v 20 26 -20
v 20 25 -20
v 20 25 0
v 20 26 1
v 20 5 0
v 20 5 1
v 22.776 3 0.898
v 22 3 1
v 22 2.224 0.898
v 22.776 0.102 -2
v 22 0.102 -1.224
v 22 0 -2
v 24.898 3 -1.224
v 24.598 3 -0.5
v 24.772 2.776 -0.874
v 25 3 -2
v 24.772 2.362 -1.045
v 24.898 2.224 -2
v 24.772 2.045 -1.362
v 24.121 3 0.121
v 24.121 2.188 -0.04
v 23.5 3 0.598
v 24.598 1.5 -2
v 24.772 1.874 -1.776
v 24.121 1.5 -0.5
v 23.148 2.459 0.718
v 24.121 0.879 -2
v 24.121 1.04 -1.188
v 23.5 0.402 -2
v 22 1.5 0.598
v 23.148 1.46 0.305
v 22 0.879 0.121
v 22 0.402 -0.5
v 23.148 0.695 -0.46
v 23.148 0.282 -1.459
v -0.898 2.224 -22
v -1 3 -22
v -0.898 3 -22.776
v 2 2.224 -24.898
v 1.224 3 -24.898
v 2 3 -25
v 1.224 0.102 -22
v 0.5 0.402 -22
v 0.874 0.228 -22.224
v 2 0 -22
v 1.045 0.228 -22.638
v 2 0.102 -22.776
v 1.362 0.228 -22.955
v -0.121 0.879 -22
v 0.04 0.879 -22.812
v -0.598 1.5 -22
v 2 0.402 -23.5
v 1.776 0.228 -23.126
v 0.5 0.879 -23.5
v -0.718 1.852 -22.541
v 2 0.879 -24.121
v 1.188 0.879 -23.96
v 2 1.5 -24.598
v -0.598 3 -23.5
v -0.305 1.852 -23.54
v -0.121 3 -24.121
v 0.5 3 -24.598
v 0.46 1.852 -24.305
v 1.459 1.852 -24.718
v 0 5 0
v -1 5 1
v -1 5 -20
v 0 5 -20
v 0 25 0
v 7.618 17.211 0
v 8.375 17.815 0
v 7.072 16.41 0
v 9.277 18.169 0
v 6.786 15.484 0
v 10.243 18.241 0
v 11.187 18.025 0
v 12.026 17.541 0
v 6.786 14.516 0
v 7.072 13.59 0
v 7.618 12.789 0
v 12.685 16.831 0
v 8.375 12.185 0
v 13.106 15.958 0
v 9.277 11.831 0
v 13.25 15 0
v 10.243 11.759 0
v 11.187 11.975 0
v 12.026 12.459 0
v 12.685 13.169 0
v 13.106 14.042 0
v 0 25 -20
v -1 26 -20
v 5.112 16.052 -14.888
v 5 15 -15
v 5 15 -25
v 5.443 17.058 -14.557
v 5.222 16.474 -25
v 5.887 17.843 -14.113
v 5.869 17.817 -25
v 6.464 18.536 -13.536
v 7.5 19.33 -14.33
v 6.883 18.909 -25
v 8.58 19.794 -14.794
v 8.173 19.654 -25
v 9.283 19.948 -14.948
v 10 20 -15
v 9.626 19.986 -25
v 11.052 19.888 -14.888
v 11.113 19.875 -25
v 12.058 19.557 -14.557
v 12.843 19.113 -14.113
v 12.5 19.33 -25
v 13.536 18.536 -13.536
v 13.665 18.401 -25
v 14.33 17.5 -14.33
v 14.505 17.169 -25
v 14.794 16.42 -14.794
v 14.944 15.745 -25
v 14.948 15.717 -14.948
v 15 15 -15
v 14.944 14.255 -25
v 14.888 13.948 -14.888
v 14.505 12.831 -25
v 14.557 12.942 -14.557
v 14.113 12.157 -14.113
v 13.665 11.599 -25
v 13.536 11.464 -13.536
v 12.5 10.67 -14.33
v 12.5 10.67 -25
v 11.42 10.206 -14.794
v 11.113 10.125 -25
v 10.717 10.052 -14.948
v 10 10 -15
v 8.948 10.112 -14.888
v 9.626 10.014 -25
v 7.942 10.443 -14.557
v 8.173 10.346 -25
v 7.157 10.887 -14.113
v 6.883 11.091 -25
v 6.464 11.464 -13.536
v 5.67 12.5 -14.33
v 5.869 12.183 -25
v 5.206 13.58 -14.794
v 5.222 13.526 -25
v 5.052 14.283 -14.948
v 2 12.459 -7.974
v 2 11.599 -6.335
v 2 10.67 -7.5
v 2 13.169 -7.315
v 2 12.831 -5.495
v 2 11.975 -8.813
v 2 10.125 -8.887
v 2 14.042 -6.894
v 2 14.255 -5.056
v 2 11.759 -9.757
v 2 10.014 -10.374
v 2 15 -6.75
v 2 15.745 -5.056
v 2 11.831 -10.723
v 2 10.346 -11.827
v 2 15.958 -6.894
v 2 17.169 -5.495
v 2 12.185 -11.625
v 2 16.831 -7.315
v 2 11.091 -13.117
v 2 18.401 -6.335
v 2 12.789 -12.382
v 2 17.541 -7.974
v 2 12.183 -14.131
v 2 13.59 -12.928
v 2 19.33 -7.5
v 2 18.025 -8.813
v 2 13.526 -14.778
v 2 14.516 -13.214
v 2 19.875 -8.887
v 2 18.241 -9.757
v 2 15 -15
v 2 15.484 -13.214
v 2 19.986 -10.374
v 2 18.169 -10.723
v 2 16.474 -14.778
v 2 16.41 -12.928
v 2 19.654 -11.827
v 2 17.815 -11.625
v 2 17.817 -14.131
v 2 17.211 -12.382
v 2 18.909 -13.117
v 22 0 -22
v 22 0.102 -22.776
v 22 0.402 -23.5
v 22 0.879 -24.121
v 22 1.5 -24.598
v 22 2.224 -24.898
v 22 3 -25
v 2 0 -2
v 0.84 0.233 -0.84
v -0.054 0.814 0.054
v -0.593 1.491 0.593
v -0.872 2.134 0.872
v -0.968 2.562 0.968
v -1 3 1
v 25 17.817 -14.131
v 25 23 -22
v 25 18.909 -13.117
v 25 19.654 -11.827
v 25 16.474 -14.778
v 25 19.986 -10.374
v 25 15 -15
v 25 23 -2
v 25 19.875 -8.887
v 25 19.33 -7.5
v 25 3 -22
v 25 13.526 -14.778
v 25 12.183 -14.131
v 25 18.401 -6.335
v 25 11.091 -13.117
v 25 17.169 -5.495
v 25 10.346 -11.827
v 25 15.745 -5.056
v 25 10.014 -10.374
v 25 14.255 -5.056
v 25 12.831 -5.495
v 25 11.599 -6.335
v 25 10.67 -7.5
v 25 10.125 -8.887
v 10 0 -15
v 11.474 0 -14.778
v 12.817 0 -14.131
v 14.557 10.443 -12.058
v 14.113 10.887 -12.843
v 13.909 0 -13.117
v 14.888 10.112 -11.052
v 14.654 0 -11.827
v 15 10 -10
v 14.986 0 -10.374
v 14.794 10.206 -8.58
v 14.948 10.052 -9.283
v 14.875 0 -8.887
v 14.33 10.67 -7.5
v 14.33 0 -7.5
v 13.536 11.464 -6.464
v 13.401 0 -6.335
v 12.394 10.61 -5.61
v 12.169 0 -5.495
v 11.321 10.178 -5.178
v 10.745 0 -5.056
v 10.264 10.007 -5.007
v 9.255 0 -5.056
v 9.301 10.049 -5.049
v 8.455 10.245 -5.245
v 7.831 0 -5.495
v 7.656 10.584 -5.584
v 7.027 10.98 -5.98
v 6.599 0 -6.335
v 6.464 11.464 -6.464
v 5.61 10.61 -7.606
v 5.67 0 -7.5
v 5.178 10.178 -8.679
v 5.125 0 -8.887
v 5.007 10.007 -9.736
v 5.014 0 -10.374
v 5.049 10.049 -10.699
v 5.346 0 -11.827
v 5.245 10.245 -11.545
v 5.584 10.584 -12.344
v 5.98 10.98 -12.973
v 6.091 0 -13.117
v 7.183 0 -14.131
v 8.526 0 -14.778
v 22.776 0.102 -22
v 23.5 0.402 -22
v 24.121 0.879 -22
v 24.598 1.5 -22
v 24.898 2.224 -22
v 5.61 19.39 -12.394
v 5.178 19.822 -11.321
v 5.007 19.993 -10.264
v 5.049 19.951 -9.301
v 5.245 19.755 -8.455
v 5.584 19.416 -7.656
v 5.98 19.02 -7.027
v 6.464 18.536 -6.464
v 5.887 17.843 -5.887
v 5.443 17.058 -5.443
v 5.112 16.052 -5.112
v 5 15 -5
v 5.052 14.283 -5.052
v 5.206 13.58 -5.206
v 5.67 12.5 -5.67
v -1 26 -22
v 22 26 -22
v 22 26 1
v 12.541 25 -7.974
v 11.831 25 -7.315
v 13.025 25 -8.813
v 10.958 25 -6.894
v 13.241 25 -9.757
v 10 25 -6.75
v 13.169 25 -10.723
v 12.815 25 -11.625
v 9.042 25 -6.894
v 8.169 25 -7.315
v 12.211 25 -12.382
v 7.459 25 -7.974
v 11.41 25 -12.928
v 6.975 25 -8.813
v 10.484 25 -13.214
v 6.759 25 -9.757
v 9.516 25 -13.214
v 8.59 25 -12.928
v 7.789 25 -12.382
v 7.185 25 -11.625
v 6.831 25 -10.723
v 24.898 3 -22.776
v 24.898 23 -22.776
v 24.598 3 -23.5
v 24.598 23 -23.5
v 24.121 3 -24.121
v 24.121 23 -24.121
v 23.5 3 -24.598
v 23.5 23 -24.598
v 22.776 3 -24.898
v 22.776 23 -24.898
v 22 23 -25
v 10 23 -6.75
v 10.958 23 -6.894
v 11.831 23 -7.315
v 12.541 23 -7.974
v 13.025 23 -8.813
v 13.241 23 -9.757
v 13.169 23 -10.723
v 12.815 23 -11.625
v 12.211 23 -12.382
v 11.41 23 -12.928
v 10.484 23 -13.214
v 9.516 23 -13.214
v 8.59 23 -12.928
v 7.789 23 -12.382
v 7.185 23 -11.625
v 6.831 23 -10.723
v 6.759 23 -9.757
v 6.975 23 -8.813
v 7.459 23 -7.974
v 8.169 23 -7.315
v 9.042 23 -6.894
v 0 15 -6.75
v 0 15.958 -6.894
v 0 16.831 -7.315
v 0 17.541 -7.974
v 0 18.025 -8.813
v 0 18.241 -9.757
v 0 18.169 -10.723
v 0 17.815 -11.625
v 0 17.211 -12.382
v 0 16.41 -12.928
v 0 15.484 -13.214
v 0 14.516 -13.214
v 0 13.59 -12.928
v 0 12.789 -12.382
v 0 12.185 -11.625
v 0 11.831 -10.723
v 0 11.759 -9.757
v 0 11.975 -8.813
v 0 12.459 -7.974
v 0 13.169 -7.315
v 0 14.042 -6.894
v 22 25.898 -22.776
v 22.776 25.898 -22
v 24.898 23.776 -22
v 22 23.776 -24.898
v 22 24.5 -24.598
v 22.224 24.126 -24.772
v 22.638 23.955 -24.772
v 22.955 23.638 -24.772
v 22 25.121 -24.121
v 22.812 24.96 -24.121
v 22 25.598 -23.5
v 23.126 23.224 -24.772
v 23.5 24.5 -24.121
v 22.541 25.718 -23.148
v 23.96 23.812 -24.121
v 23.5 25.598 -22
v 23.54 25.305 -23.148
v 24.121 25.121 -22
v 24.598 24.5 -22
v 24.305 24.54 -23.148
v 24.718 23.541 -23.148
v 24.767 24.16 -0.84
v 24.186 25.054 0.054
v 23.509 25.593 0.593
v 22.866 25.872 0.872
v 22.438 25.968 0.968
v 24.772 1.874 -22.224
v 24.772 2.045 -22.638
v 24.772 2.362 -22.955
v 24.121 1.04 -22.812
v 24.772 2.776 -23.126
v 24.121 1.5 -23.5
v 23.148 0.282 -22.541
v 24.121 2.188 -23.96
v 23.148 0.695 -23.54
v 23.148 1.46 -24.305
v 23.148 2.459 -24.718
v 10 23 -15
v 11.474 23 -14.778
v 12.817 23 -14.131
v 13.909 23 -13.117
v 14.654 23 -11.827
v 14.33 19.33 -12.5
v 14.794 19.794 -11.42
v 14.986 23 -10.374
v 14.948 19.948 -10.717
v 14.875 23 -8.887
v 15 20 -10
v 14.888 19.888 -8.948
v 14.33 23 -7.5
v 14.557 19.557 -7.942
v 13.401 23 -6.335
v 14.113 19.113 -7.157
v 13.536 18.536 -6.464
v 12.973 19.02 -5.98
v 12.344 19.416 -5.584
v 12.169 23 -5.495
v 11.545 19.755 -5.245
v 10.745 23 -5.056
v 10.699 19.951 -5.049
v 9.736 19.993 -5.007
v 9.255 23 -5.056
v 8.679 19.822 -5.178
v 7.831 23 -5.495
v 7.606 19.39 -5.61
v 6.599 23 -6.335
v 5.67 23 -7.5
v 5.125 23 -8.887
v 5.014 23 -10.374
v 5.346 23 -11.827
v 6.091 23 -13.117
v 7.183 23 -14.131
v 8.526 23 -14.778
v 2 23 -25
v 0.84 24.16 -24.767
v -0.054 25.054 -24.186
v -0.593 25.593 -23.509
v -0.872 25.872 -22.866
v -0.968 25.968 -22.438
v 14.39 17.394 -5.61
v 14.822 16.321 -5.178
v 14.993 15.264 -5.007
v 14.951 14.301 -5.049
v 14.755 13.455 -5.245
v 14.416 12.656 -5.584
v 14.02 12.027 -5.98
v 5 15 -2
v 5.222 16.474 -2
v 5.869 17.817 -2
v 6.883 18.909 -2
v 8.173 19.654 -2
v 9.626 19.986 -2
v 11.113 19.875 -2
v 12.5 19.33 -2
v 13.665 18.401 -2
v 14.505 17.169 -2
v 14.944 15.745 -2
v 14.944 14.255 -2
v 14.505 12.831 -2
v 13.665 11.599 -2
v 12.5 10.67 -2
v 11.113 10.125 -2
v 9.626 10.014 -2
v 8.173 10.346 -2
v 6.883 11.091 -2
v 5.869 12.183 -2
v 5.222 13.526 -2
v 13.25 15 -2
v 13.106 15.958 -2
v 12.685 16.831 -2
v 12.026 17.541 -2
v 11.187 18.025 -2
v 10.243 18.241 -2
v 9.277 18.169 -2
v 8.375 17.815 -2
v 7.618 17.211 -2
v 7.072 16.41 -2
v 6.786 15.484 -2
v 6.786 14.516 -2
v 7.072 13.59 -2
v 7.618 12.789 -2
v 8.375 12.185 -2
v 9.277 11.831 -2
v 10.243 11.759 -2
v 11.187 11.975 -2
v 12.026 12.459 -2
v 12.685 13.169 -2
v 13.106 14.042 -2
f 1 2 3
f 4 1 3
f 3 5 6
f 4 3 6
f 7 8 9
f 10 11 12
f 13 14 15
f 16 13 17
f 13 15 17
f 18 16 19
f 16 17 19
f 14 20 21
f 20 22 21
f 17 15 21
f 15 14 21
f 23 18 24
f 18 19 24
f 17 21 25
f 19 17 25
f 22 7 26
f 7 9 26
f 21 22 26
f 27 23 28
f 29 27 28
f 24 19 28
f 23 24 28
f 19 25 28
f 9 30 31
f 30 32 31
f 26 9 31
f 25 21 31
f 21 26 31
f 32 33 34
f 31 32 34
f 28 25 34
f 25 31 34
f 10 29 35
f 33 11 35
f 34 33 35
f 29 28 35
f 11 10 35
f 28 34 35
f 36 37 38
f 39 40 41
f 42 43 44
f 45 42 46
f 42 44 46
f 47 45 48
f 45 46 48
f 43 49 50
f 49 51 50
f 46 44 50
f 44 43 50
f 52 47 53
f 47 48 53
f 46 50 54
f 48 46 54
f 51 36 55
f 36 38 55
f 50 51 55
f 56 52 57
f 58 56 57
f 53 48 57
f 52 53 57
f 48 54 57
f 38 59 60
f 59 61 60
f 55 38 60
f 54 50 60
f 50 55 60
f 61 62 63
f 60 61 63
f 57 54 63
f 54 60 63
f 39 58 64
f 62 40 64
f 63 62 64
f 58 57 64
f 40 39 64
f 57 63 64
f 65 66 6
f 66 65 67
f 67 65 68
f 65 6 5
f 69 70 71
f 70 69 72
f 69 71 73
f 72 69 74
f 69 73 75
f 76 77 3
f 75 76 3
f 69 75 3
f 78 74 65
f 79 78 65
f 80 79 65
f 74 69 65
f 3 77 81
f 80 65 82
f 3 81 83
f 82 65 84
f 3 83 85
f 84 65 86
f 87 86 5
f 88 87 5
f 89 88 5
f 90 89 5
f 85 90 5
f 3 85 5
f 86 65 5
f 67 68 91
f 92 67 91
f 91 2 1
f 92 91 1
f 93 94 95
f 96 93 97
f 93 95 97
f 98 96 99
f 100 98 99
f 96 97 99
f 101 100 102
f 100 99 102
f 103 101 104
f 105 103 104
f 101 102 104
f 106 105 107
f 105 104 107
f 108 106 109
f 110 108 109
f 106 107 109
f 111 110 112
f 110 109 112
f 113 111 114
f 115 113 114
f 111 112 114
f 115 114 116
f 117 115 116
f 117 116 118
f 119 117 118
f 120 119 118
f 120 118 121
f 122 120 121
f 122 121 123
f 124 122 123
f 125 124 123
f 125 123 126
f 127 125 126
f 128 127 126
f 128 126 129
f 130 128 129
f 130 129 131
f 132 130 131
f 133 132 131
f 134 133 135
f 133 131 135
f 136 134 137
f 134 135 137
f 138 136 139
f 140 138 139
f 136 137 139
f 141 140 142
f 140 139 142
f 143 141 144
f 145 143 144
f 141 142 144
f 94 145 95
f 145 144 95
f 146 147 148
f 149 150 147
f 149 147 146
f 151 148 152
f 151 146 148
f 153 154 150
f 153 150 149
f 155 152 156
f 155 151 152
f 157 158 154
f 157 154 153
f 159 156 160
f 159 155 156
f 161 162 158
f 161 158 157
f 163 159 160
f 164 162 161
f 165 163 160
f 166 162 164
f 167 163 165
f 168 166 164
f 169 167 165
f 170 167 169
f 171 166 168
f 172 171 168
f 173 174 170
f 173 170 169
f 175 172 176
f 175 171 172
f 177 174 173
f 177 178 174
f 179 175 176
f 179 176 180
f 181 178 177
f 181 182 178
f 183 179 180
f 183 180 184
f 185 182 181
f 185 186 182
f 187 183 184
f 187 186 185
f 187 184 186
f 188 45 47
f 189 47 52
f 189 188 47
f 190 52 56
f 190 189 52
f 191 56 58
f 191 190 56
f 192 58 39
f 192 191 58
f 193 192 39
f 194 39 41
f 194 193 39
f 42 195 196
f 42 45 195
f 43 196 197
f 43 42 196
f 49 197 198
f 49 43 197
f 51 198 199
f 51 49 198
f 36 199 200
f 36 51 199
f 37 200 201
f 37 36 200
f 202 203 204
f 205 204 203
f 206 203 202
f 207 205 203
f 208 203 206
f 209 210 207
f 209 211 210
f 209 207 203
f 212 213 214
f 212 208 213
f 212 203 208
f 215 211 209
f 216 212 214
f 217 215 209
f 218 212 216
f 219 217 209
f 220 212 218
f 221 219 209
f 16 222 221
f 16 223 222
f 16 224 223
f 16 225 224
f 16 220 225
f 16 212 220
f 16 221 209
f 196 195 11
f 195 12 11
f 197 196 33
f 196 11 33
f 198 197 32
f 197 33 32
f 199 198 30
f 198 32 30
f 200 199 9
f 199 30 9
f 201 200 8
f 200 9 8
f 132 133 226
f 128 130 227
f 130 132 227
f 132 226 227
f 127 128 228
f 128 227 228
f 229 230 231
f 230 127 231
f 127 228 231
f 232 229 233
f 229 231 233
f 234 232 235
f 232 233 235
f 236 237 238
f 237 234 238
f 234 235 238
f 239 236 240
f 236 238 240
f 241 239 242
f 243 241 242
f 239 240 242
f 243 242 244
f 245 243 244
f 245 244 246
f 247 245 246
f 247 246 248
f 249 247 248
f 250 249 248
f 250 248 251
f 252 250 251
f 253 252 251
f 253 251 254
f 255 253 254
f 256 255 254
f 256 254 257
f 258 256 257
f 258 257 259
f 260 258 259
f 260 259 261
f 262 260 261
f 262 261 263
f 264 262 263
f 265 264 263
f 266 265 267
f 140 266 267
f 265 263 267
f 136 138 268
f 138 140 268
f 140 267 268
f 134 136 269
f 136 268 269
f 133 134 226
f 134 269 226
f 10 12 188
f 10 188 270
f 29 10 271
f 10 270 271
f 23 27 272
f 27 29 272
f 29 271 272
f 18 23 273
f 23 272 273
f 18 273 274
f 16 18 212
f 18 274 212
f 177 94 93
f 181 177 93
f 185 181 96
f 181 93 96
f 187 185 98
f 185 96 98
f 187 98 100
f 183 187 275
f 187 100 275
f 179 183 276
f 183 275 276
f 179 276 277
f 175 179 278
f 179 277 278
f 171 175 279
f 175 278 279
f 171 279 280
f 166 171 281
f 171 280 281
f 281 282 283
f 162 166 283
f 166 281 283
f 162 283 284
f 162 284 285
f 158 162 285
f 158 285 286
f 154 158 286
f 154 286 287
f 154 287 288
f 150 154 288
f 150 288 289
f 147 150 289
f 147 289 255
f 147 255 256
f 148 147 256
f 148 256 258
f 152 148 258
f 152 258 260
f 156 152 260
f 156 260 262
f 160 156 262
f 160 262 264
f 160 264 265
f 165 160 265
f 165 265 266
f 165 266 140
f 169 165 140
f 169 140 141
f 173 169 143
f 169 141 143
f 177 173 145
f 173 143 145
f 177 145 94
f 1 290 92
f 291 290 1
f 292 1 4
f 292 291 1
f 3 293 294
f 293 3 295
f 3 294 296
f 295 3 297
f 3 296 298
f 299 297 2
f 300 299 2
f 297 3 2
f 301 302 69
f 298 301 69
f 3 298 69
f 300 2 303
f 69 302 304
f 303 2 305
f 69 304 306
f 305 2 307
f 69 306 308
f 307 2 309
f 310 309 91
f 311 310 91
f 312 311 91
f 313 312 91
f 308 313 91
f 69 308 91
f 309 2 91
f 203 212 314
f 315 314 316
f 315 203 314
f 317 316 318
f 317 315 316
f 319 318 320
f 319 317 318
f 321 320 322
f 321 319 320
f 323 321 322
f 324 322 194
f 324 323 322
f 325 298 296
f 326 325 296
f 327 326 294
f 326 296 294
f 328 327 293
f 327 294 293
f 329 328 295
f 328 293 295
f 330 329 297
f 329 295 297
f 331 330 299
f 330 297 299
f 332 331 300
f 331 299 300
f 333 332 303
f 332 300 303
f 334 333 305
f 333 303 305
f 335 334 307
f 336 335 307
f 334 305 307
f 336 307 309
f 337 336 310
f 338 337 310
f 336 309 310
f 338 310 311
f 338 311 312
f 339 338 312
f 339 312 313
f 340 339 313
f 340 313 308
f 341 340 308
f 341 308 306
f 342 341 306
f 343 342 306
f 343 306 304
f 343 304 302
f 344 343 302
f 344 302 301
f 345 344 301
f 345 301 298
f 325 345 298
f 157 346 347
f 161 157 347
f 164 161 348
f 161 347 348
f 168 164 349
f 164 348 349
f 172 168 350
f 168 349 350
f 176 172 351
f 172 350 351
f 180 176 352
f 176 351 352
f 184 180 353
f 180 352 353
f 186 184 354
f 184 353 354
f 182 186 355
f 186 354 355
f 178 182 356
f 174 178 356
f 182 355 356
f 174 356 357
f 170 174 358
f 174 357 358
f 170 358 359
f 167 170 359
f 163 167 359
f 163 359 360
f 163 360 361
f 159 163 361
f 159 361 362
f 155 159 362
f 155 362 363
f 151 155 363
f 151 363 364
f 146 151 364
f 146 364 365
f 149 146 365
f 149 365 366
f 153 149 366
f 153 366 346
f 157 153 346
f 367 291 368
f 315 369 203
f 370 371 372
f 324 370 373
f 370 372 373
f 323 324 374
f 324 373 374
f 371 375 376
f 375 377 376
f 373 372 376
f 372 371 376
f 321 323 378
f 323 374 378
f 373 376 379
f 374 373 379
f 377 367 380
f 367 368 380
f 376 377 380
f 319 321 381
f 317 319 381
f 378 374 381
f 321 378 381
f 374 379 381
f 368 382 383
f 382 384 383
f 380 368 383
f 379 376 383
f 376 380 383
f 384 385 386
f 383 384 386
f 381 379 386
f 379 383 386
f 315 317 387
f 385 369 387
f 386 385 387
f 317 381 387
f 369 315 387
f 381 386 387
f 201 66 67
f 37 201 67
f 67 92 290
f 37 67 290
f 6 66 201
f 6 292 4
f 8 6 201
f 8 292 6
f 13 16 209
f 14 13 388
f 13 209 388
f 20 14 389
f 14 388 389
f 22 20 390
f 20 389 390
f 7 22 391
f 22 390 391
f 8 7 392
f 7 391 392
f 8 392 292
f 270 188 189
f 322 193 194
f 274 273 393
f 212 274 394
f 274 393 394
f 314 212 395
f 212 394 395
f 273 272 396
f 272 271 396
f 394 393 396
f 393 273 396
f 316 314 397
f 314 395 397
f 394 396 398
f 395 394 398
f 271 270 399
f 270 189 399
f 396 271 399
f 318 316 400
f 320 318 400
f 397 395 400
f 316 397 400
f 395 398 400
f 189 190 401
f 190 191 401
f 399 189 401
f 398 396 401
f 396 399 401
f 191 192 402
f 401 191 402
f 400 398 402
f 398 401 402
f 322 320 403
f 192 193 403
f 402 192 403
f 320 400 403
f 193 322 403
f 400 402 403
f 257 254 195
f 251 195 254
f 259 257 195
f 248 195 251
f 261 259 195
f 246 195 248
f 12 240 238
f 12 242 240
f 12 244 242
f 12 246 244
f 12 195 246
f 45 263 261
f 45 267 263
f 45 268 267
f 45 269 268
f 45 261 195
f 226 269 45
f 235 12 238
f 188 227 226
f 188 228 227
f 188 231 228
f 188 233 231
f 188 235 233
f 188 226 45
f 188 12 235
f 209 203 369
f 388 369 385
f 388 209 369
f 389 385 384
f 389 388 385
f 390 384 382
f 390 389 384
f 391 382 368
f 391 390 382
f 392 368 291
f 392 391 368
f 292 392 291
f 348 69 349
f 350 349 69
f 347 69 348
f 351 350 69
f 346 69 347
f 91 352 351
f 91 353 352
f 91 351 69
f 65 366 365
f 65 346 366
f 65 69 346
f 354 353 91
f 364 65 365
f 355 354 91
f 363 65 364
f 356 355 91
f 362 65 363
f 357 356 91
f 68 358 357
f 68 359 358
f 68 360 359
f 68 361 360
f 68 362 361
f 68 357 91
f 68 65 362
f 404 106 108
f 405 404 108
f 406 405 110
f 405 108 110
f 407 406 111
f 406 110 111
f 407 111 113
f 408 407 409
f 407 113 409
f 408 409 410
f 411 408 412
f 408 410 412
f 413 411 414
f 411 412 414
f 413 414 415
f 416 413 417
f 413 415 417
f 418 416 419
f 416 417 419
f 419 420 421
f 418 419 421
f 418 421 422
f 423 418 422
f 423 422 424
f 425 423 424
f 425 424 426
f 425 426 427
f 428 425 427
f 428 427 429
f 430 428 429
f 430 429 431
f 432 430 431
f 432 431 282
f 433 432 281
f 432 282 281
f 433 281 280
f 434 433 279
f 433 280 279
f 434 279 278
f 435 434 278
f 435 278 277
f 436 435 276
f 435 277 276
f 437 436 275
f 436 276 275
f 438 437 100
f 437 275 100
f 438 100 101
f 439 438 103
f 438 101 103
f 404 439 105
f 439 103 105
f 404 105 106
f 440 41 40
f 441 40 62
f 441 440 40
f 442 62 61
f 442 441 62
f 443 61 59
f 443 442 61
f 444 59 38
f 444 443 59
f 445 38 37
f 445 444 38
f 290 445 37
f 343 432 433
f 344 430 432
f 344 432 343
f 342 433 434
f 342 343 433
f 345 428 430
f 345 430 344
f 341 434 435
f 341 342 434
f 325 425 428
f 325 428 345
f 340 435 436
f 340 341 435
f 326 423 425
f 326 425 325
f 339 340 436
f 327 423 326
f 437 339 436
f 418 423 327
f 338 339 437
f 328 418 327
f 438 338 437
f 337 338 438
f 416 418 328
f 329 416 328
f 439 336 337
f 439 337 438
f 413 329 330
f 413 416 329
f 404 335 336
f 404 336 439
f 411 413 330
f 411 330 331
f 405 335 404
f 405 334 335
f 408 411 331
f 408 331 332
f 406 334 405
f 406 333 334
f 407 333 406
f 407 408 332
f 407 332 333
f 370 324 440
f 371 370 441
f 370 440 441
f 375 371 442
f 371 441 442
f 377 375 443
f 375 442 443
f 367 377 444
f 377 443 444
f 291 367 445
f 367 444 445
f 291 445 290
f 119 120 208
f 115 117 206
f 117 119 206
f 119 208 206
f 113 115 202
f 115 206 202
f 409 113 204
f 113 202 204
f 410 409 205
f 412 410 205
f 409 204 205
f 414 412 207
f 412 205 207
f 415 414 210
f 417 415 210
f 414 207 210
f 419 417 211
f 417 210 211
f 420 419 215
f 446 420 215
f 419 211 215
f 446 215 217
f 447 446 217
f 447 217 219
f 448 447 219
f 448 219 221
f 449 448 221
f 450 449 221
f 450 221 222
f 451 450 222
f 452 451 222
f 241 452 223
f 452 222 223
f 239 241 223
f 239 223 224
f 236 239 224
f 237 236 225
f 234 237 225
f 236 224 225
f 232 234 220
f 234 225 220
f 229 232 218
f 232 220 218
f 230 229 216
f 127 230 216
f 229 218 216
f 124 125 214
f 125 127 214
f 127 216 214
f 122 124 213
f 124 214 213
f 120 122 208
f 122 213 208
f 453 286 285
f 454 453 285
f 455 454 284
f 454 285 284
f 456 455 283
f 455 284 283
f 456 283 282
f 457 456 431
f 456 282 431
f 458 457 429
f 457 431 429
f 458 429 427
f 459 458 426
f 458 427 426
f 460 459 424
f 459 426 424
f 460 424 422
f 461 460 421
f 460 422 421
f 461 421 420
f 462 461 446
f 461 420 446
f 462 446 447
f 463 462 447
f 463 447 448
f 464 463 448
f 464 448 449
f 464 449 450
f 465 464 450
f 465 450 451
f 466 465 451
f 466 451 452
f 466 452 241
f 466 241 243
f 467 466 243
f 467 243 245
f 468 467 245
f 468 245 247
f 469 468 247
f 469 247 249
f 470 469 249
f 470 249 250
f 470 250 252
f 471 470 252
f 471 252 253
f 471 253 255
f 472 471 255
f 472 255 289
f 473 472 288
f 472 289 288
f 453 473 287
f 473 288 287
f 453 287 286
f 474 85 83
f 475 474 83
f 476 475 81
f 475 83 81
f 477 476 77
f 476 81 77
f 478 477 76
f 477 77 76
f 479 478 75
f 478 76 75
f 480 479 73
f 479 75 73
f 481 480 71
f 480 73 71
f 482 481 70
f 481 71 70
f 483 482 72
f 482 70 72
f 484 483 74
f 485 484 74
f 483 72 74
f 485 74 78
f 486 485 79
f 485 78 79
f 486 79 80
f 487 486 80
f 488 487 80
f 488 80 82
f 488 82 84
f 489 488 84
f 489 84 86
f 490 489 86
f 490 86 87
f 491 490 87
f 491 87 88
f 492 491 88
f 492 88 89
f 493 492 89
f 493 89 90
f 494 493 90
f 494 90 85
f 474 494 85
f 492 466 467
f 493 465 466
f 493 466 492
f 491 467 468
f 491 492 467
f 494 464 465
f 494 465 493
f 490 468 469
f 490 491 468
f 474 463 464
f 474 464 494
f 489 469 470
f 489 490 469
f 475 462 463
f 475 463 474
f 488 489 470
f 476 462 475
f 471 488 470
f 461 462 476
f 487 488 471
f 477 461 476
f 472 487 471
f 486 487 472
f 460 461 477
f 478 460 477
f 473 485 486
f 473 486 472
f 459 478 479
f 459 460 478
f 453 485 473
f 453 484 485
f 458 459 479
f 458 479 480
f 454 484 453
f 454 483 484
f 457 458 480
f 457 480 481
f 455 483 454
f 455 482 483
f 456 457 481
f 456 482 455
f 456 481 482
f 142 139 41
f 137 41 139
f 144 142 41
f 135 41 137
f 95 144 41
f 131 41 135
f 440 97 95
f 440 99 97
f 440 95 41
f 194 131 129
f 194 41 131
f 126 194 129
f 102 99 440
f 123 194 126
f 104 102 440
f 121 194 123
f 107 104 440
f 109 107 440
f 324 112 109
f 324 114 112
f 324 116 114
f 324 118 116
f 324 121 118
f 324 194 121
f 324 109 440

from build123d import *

# Parameters (mm, degrees)
SKETCH2_W           = 25
SKETCH2_H           = 25
BOSS_EXTRUDE1_DEPTH = 25
SKETCH3_R           = 3.25
CUT_EXTRUDE1_DEPTH  = 44.301270189
SKETCH4_R           = 3.25
CUT_EXTRUDE2_DEPTH  = 44.301270189
SKETCH5_R           = 3.25
CUT_EXTRUDE3_DEPTH  = 44.301270189
SKETCH6_R           = 5
CUT_EXTRUDE4_DEPTH  = 23
SKETCH7_R           = 5
CUT_EXTRUDE5_DEPTH  = 23
SKETCH12_R          = 5
CUT_EXTRUDE9_DEPTH  = 23
BOSS_EXTRUDE2_DEPTH = 1
BOSS_EXTRUDE3_DEPTH = 1
BOSS_EXTRUDE4_DEPTH = 1
FILLET2_R           = 3


with BuildPart() as part:
    # Sketch2 → Boss-Extrude1 (new body)
    with BuildSketch(Plane(origin=(0, 0, 0), x_dir=(1, 0, 0), z_dir=(0, 1, 0))):
        with Locations((12.5, 12.5)):
            Rectangle(SKETCH2_W, SKETCH2_H)
    extrude(amount=BOSS_EXTRUDE1_DEPTH)

    # Sketch3 → Cut-Extrude1 (cut, through all)
    with BuildSketch(Plane(origin=(0, 25, 0), x_dir=(1, 0, 0), z_dir=(0, 1, 0))):
        with Locations(Location((10, 10, 0), (0, 0, 270))):
            Circle(SKETCH3_R)
    extrude(amount=-CUT_EXTRUDE1_DEPTH, mode=Mode.SUBTRACT)

    # Sketch4 → Cut-Extrude2 (cut, through all)
    with BuildSketch(Plane.ZY):
        with Locations((-10, 15)):
            Circle(SKETCH4_R)
    extrude(amount=-CUT_EXTRUDE2_DEPTH, mode=Mode.SUBTRACT)

    # Sketch5 → Cut-Extrude3 (cut, through all)
    with BuildSketch(Plane.XY):
        with Locations((10, 15)):
            Circle(SKETCH5_R)
    extrude(amount=-CUT_EXTRUDE3_DEPTH, mode=Mode.SUBTRACT)

    # Sketch6 → Cut-Extrude4 (cut)
    with BuildSketch(Plane(origin=(0, 0, -25), x_dir=(-1, 0, 0), z_dir=(0, 0, -1))):
        with Locations((-10, 15)):
            Circle(SKETCH6_R)
    extrude(amount=-CUT_EXTRUDE4_DEPTH, mode=Mode.SUBTRACT)

    # Sketch7 → Cut-Extrude5 (cut)
    with BuildSketch(Plane(origin=(25, 0, 0), x_dir=(0, 0, -1), z_dir=(1, 0, 0))):
        with Locations((10, 15)):
            Circle(SKETCH7_R)
    extrude(amount=-CUT_EXTRUDE5_DEPTH, mode=Mode.SUBTRACT)

    # Sketch12 → Cut-Extrude9 (cut)
    with BuildSketch(Plane.XZ):
        with Locations(Location((10, -10, 0), (0, 0, 270))):
            Circle(SKETCH12_R)
    extrude(amount=-CUT_EXTRUDE9_DEPTH, mode=Mode.SUBTRACT)

    # Sketch19 → Boss-Extrude2 (add)
    with BuildSketch(Plane.XY):
        Polygon((20, 25), (20, 5), (0, 5), (0, 0), (25, 0), (25, 25), align=None)
    extrude(amount=BOSS_EXTRUDE2_DEPTH)

    # Sketch20 → Boss-Extrude3 (add)
    with BuildSketch(Plane(origin=(0, 25, 0), x_dir=(1, 0, 0), z_dir=(0, 1, 0))):
        Polygon((20, 0), (20, 20), (0, 20), (0, 25), (25, 25), (25, -1), (20, -1), align=None)
    extrude(amount=BOSS_EXTRUDE3_DEPTH)

    # Sketch21 → Boss-Extrude4 (add)
    with BuildSketch(Plane.ZY):
        Polygon((-20, 5), (0, 5), (1, 5), (1, 0), (-25, 0), (-25, 26), (-20, 26), (-20, 25), align=None)
    extrude(amount=BOSS_EXTRUDE4_DEPTH)

    # Fillet2
    fillet2_edges = [part.edges().sort_by_distance(p)[0] for p in [
        (12, 0, 1),
        (25, 13, 1),
        (25, 26, -12),
        (12, 26, -25),
        (-1, 13, -25),
        (-1, 0, -12),
        (12, 0, -25),
        (25, 0, -12),
        (25, 13, -25),
    ]]
    fillet(fillet2_edges, radius=FILLET2_R)


solid = part.part
